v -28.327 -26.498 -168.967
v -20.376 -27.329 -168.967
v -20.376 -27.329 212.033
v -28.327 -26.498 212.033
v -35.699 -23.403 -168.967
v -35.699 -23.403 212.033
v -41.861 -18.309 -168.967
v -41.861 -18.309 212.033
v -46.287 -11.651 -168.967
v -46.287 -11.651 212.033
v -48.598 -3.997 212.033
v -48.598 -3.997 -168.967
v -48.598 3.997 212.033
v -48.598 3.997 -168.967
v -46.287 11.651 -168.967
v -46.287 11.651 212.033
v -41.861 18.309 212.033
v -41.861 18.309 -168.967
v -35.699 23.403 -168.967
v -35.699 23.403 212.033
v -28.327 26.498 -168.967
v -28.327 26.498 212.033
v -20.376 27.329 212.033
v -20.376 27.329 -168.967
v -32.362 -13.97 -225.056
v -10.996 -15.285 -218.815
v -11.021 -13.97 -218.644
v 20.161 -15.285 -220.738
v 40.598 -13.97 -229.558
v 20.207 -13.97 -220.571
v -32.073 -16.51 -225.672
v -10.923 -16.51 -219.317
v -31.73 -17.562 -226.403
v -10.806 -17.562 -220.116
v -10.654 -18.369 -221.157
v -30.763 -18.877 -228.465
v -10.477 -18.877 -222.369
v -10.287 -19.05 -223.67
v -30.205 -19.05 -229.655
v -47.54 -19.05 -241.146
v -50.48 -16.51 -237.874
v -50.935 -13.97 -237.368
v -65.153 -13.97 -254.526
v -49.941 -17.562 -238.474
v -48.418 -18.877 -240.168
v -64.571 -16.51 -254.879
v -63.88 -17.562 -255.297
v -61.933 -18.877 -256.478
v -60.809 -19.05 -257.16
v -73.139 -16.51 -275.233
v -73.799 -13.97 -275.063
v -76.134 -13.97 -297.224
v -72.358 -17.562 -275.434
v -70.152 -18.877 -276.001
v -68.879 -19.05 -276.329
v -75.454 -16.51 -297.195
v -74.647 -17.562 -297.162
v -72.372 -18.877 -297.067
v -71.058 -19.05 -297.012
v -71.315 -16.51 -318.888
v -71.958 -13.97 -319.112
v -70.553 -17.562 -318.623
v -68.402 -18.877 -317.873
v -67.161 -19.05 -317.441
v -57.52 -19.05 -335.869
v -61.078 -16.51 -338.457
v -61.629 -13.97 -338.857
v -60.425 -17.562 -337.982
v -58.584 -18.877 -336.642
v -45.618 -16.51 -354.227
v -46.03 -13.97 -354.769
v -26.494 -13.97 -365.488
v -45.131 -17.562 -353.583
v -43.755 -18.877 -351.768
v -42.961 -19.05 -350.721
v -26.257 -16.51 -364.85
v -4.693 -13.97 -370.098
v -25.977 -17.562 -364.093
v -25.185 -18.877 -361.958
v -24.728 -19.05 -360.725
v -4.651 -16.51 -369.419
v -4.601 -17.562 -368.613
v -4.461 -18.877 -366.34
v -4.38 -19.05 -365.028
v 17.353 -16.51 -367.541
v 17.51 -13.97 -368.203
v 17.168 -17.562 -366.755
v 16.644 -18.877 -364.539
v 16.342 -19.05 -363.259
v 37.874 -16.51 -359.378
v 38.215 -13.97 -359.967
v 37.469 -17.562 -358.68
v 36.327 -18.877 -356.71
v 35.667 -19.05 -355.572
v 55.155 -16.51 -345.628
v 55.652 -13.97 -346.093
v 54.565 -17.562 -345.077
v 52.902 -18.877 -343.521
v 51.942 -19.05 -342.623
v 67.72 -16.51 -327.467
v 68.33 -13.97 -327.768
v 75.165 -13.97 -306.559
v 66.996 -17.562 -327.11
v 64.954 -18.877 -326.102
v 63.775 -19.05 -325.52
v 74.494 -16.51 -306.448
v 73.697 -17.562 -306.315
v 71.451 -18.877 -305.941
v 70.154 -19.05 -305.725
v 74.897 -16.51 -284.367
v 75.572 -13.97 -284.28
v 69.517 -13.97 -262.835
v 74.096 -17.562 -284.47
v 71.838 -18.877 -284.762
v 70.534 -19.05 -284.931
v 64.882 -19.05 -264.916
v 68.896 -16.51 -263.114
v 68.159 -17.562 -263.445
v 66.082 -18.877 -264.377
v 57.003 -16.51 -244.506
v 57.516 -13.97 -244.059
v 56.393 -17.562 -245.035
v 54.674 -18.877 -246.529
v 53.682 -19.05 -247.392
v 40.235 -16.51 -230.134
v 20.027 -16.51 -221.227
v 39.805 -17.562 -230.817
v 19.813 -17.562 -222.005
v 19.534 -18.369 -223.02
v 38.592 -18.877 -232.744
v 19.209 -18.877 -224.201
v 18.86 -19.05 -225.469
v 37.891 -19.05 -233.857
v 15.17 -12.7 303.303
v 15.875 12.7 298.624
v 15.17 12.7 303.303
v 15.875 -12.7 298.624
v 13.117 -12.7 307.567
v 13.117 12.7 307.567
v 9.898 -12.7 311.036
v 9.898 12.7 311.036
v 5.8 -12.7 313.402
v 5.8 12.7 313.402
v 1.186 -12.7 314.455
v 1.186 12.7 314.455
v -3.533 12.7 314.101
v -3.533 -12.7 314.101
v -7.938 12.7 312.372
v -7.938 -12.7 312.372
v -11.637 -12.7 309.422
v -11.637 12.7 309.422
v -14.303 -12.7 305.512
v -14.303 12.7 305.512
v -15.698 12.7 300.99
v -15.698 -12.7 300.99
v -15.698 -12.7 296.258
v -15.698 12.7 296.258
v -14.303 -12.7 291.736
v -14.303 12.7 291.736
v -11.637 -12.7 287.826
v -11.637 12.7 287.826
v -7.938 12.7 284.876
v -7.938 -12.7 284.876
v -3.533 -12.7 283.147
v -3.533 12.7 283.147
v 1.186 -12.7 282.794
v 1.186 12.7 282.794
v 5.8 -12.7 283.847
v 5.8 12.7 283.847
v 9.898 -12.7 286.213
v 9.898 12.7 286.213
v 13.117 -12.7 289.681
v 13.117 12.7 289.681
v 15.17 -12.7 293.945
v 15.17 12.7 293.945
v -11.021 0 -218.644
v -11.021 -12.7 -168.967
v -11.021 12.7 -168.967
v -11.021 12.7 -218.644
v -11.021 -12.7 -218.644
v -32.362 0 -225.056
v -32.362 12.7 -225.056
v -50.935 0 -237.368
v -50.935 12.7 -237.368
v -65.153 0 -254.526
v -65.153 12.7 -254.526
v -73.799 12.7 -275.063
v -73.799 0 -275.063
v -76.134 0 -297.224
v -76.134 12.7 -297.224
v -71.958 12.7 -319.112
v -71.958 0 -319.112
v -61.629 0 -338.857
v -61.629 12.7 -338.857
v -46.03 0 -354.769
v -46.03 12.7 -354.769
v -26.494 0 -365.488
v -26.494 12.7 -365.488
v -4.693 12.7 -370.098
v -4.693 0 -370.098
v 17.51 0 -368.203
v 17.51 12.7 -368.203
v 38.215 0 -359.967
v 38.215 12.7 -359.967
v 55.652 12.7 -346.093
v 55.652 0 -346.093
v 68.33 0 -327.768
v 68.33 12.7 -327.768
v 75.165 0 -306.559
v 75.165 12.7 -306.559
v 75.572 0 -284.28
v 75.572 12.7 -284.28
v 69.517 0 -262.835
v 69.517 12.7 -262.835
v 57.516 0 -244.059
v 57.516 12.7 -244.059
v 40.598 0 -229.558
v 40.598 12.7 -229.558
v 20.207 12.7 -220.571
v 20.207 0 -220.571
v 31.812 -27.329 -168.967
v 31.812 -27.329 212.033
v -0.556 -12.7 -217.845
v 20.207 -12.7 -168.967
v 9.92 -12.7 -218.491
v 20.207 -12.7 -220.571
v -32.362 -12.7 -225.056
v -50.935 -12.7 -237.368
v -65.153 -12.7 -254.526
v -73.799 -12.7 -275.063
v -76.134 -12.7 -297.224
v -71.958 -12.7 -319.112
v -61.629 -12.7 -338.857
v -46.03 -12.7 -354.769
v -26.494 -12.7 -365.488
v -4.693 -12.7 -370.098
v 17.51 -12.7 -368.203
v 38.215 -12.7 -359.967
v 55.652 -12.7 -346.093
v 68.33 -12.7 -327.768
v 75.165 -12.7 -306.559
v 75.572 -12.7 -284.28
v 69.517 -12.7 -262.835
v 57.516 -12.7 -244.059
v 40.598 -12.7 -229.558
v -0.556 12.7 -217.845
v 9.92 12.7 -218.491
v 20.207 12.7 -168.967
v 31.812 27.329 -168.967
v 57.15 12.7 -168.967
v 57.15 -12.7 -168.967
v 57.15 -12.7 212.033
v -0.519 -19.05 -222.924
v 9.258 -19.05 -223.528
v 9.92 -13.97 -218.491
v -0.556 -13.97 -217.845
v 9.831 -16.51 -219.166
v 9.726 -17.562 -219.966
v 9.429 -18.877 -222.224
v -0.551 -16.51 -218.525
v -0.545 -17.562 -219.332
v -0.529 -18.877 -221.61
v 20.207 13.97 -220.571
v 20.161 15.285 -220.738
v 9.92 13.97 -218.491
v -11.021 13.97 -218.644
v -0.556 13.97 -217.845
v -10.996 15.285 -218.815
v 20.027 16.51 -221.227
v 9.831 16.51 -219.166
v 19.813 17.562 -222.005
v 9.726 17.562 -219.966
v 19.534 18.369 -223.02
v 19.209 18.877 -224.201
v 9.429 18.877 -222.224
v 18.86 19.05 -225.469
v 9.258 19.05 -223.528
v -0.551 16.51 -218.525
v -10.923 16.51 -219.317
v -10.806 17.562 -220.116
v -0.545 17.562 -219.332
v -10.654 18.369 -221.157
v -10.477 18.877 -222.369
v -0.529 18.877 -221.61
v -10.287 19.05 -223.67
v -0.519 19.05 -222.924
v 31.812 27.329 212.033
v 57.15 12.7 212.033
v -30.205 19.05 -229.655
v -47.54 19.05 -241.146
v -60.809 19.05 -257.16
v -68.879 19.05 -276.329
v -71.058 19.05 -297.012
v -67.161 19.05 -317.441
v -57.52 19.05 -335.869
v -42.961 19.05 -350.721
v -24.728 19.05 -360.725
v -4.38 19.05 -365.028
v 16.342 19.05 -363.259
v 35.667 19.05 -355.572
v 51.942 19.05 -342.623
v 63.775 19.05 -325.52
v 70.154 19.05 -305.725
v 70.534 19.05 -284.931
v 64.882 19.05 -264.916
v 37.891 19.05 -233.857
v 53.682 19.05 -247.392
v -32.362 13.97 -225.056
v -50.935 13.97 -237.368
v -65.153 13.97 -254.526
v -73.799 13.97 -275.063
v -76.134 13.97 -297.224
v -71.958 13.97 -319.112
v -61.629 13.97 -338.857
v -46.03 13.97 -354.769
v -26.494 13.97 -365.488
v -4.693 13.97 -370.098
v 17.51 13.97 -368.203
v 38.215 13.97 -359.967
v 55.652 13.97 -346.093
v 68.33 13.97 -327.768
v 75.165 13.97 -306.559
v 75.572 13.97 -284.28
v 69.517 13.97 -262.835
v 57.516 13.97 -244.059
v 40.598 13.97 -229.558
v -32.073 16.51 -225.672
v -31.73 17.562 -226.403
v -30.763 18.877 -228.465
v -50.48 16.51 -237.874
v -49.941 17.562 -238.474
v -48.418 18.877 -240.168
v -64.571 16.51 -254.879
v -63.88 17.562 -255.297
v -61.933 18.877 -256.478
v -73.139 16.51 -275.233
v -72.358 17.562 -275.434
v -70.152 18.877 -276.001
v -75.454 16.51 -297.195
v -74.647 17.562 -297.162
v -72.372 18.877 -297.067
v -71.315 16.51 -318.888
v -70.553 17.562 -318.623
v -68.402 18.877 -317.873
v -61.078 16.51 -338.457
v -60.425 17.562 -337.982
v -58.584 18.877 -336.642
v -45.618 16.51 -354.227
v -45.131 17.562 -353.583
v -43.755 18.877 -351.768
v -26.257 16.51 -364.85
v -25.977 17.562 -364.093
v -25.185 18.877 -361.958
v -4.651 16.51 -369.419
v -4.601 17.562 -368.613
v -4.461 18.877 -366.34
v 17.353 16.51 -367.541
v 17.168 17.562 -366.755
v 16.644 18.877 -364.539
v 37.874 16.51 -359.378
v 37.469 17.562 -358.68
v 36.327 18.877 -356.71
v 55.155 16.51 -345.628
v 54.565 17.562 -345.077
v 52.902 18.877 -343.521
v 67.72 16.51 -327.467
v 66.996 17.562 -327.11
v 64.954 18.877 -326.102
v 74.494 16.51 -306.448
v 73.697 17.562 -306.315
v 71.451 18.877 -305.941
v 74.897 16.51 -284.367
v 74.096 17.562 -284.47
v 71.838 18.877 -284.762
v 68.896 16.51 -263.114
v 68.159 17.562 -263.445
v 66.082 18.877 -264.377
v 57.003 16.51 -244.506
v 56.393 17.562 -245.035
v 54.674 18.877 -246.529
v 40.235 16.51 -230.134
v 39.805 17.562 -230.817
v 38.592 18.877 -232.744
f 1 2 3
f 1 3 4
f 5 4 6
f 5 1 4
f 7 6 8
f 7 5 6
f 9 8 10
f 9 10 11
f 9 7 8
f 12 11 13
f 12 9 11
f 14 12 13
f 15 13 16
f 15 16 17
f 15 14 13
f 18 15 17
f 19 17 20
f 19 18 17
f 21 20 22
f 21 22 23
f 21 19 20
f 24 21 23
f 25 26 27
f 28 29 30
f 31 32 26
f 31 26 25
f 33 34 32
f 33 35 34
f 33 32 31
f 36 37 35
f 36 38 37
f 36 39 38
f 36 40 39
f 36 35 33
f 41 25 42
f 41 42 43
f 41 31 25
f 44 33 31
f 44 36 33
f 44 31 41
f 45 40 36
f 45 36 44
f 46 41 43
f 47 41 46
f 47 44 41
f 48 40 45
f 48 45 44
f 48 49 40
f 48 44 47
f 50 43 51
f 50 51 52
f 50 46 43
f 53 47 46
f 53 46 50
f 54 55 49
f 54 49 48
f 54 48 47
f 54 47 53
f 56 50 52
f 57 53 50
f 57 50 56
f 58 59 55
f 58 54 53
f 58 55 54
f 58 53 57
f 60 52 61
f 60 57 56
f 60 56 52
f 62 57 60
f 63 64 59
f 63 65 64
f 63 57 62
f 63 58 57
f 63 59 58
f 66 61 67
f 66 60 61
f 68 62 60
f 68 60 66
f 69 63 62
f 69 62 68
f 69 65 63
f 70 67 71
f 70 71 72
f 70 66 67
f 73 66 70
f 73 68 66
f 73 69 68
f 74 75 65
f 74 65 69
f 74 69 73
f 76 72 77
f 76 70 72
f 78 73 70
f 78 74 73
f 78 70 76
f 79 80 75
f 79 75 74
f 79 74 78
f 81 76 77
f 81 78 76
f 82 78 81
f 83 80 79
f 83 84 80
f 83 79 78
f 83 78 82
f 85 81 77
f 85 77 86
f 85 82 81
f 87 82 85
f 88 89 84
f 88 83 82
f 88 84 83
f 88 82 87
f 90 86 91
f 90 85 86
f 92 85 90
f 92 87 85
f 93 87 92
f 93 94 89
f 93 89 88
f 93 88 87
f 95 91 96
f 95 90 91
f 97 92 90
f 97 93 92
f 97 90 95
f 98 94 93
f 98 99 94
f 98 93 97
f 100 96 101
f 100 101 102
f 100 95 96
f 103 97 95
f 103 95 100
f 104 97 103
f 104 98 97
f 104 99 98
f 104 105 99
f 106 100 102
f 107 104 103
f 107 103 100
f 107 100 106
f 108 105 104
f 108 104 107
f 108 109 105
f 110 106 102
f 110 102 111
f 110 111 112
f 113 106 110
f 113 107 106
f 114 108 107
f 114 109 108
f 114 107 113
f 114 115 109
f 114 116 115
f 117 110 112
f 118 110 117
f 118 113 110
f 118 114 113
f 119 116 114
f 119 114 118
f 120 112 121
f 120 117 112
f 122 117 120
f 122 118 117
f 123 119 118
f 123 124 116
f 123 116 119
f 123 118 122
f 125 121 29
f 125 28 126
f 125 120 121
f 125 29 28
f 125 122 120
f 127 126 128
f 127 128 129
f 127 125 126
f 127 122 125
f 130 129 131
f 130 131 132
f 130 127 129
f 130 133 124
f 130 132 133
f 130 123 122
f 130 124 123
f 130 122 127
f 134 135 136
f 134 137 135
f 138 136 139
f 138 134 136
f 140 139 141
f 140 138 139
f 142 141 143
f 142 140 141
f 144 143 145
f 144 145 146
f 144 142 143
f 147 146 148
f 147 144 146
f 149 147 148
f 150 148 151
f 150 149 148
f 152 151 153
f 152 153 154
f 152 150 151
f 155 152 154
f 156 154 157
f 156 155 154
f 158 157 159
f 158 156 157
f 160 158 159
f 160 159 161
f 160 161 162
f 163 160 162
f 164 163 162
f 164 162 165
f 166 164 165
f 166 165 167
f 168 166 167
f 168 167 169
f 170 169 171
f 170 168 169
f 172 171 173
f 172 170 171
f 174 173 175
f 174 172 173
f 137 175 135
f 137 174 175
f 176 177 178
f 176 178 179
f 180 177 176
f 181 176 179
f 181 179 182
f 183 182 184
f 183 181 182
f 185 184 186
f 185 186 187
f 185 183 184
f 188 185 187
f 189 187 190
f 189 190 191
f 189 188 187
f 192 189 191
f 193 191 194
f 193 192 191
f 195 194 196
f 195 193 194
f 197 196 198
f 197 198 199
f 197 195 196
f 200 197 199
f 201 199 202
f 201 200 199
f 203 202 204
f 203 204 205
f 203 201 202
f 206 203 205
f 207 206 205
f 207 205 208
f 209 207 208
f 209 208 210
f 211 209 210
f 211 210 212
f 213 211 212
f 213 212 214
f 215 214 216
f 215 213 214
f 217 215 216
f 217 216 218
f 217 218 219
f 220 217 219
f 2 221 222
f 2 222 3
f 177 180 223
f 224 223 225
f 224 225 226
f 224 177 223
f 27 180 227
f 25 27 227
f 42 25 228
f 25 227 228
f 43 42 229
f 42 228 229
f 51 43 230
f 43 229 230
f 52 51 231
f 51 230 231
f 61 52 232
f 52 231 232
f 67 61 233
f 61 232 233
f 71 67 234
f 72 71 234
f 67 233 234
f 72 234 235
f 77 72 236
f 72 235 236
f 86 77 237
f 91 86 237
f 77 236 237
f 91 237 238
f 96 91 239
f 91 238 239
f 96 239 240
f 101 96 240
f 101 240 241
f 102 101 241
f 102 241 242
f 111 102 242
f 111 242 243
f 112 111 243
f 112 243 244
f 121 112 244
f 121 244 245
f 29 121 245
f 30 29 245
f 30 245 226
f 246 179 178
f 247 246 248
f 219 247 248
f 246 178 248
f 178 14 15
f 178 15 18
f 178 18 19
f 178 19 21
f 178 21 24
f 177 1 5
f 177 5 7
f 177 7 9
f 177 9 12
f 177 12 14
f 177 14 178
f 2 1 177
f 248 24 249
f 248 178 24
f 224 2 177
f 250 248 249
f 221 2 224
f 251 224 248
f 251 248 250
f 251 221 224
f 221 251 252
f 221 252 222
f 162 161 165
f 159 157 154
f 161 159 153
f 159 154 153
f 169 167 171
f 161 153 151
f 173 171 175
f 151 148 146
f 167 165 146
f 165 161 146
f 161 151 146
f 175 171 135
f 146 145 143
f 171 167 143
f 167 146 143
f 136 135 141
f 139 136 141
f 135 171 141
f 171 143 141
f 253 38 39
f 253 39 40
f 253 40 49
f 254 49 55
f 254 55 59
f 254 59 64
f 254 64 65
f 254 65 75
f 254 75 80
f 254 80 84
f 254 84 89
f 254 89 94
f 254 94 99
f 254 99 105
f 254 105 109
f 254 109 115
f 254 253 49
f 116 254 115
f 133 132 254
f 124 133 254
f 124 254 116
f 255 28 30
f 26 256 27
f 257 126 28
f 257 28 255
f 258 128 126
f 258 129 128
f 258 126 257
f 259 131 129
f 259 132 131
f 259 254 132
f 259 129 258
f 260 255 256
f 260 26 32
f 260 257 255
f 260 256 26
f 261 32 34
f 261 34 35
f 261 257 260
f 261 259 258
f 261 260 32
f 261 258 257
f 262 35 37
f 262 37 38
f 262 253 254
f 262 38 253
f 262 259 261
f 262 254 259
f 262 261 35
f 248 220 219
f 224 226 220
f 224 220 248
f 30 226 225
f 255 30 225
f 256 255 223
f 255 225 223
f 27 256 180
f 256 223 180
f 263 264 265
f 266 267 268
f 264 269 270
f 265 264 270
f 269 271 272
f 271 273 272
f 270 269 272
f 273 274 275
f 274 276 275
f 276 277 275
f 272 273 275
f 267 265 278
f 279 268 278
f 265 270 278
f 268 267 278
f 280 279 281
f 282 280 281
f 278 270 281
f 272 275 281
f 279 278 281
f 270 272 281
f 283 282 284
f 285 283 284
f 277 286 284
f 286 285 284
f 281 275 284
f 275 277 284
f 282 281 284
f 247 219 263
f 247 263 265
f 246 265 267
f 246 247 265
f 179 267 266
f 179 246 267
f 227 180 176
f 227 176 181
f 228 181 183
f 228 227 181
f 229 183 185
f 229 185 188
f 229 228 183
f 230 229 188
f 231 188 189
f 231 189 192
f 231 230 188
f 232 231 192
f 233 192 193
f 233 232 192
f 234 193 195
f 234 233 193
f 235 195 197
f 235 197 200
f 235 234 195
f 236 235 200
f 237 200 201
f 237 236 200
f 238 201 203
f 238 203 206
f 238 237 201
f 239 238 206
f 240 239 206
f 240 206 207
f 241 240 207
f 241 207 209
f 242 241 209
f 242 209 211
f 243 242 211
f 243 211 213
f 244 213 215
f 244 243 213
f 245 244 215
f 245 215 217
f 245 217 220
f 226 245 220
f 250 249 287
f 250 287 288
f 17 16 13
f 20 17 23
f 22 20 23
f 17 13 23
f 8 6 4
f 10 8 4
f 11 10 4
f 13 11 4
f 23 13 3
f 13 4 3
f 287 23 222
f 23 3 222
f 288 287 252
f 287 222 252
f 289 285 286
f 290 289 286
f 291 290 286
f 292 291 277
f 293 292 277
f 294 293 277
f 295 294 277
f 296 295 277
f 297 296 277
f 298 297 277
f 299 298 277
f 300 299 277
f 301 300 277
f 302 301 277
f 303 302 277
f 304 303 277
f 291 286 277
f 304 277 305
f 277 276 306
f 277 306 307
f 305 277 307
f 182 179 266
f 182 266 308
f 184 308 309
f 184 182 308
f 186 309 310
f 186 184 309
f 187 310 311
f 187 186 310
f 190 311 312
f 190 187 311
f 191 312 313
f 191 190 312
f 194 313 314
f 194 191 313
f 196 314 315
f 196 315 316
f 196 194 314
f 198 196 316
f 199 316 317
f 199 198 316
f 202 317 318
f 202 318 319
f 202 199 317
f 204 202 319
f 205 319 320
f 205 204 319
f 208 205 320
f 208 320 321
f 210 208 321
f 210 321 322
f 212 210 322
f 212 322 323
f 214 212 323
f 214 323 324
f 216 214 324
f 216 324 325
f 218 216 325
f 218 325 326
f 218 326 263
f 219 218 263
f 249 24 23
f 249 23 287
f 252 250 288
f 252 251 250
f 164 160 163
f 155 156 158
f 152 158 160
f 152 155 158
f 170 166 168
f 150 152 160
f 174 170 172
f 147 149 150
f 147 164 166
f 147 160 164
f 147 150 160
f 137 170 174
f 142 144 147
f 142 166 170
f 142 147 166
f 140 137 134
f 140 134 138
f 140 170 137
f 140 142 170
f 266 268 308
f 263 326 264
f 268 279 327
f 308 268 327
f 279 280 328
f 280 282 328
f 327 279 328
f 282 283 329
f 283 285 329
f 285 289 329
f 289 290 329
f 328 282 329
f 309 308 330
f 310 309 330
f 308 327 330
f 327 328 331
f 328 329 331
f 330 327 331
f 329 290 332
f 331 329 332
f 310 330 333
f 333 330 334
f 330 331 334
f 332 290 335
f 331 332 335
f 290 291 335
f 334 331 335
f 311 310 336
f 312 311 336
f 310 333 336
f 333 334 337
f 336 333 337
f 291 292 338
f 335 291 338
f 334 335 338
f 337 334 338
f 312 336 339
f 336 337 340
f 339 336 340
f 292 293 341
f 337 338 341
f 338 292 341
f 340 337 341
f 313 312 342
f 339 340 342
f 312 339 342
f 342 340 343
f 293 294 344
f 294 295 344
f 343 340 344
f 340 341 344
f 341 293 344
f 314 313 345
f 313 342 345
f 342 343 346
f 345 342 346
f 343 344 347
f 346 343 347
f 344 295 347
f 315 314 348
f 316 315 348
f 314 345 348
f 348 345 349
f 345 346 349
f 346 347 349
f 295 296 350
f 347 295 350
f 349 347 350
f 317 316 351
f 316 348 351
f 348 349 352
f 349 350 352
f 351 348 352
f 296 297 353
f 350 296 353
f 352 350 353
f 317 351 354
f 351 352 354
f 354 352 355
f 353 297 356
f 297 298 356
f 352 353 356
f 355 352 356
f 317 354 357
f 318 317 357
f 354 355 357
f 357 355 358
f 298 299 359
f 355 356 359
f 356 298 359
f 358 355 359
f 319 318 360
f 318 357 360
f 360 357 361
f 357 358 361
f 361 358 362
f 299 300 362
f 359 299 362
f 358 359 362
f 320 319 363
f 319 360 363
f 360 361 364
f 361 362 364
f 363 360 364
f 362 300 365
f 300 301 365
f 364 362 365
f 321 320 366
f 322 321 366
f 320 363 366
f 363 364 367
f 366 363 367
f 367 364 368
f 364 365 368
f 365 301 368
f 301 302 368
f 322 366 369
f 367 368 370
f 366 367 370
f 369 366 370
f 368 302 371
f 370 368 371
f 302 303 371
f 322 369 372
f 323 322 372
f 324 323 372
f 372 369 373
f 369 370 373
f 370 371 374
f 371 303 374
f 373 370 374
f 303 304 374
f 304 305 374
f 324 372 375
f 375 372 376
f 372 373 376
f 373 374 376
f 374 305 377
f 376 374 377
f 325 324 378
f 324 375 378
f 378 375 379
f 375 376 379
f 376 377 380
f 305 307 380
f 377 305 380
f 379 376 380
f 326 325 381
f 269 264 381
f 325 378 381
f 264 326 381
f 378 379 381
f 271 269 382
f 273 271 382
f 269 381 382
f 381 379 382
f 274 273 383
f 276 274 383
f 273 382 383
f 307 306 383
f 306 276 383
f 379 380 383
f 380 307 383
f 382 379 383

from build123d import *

# Parameters (mm, degrees)
F1_DEPTH = 12.7
F0_R     = 15.875
F2_DEPTH = 12.7
F3_DEPTH = 19.05
F5_DEPTH = 381
F6_R     = 5.08


with BuildPart() as f1:
    # F0 (on Front) → F1 (new body, symmetric)
    with BuildSketch(Plane.XZ):
        Polygon((57.15, 212.0332655495), (-19.05, 212.0332655495), (-19.05, -168.9667344505), (-11.0213747248, -168.9667344505), (0, -168.9667344505), (17.0811599865, -168.9667344505), (20.2070903033, -168.9667344505), (57.15, -168.9667344505), align=None)
        with BuildLine():
            Line((0, -168.9667344505), (-11.0213747248, -168.9667344505))
            Line((-11.0213747248, -168.9667344505), (-11.0213747248, -218.6437752822))
            ThreePointArc((-11.0213747248, -218.6437752822), (4.6928199973, -217.9871529405), (20.2070903033, -220.5706555117))
            Line((20.2070903033, -220.5706555117), (20.2070903033, -168.9667344505))
            Line((20.2070903033, -168.9667344505), (17.0811599865, -168.9667344505))
            Line((17.0811599865, -168.9667344505), (0, -168.9667344505))
        make_face()
    extrude(amount=F1_DEPTH, both=True)



with BuildPart() as f1b:
    # F0 (on Front) → F1, piece 2 (new body, symmetric)
    with BuildSketch(Plane.XZ):
        with BuildLine():
            Line((-11.0213747248, -232.3558569366), (-11.0213747248, -218.6437752822))
            ThreePointArc((-11.0213747248, -218.6437752822), (-49.8327765932, -351.6891443779), (76.2, -294.0425106773))
            ThreePointArc((76.2, -294.0425106773), (60.6061889625, -247.8545267481), (20.2070903033, -220.5706555117))
            Line((20.2070903033, -220.5706555117), (20.2070903033, -232.3558569366))
            Line((20.2070903033, -232.3558569366), (-11.0213747248, -232.3558569366))
        make_face()
    extrude(amount=F1_DEPTH, both=True)


with BuildPart() as f2:
    # F0 (on Front) → F2 (new body, symmetric)
    with BuildSketch(Plane.XZ):
        with Locations((0, 298.6241839262)):
            Circle(F0_R)
    extrude(amount=F2_DEPTH, both=True)


with BuildPart() as f1_1:
    add(f1.part)

    add(f1b.part)  # F3 merges F1b
    # F0 (on Front) → F3 (join, symmetric)
    with BuildSketch(Plane.XZ):
        with BuildLine():
            Line((-11.0213747248, -232.3558569366), (-11.0213747248, -218.6437752822))
            ThreePointArc((-11.0213747248, -218.6437752822), (-49.8327765932, -351.6891443779), (76.2, -294.0425106773))
            ThreePointArc((76.2, -294.0425106773), (60.6061889625, -247.8545267481), (20.2070903033, -220.5706555117))
            Line((20.2070903033, -220.5706555117), (20.2070903033, -232.3558569366))
            Line((20.2070903033, -232.3558569366), (-11.0213747248, -232.3558569366))
        make_face()
        with BuildLine():
            ThreePointArc((20.2070903033, -220.5706555117), (4.6928199973, -217.9871529405), (-11.0213747248, -218.6437752822))
            Line((-11.0213747248, -218.6437752822), (-11.0213747248, -232.3558569366))
            Line((-11.0213747248, -232.3558569366), (20.2070903033, -232.3558569366))
            Line((20.2070903033, -232.3558569366), (20.2070903033, -220.5706555117))
        make_face()
    extrude(amount=F3_DEPTH, both=True)

    # F4 (on face) → F5 (join, through all)
    with BuildSketch(Plane(origin=(0, 0, -168.9667344505), x_dir=(1, 0, 0), z_dir=(0, 0, -1))):
        with BuildLine():
            Line((31.8119843732, 27.3289101429), (-20.3755640355, 27.3289101429))
            ThreePointArc((-20.3755640355, 27.3289101429), (-48.8921323698, 0), (-20.3755640355, -27.3289101429))
            Line((-20.3755640355, -27.3289101429), (31.8119843732, -27.3289101429))
            Line((31.8119843732, -27.3289101429), (57.15, -12.7))
            Line((57.15, -12.7), (20.2070903033, -12.7))
            Line((20.2070903033, -12.7), (20.2070903033, 12.7))
            Line((20.2070903033, 12.7), (57.15, 12.7))
            Line((57.15, 12.7), (31.8119843732, 27.3289101429))
        make_face()
        Polygon((57.15, 0), (57.15, 12.7), (20.2070903033, 12.7), (20.2070903033, -12.7), (57.15, -12.7), align=None)
    extrude(amount=-F5_DEPTH)

    # F6
    f6_edges = [f1_1.edges().sort_by_distance(p)[0] for p in [
        (-76.2, -19.05, -294.042511),
        (-76.2, 19.05, -294.042511),
    ]]
    fillet(f6_edges, radius=F6_R)


solid = Compound([f2.part, f1_1.part])
